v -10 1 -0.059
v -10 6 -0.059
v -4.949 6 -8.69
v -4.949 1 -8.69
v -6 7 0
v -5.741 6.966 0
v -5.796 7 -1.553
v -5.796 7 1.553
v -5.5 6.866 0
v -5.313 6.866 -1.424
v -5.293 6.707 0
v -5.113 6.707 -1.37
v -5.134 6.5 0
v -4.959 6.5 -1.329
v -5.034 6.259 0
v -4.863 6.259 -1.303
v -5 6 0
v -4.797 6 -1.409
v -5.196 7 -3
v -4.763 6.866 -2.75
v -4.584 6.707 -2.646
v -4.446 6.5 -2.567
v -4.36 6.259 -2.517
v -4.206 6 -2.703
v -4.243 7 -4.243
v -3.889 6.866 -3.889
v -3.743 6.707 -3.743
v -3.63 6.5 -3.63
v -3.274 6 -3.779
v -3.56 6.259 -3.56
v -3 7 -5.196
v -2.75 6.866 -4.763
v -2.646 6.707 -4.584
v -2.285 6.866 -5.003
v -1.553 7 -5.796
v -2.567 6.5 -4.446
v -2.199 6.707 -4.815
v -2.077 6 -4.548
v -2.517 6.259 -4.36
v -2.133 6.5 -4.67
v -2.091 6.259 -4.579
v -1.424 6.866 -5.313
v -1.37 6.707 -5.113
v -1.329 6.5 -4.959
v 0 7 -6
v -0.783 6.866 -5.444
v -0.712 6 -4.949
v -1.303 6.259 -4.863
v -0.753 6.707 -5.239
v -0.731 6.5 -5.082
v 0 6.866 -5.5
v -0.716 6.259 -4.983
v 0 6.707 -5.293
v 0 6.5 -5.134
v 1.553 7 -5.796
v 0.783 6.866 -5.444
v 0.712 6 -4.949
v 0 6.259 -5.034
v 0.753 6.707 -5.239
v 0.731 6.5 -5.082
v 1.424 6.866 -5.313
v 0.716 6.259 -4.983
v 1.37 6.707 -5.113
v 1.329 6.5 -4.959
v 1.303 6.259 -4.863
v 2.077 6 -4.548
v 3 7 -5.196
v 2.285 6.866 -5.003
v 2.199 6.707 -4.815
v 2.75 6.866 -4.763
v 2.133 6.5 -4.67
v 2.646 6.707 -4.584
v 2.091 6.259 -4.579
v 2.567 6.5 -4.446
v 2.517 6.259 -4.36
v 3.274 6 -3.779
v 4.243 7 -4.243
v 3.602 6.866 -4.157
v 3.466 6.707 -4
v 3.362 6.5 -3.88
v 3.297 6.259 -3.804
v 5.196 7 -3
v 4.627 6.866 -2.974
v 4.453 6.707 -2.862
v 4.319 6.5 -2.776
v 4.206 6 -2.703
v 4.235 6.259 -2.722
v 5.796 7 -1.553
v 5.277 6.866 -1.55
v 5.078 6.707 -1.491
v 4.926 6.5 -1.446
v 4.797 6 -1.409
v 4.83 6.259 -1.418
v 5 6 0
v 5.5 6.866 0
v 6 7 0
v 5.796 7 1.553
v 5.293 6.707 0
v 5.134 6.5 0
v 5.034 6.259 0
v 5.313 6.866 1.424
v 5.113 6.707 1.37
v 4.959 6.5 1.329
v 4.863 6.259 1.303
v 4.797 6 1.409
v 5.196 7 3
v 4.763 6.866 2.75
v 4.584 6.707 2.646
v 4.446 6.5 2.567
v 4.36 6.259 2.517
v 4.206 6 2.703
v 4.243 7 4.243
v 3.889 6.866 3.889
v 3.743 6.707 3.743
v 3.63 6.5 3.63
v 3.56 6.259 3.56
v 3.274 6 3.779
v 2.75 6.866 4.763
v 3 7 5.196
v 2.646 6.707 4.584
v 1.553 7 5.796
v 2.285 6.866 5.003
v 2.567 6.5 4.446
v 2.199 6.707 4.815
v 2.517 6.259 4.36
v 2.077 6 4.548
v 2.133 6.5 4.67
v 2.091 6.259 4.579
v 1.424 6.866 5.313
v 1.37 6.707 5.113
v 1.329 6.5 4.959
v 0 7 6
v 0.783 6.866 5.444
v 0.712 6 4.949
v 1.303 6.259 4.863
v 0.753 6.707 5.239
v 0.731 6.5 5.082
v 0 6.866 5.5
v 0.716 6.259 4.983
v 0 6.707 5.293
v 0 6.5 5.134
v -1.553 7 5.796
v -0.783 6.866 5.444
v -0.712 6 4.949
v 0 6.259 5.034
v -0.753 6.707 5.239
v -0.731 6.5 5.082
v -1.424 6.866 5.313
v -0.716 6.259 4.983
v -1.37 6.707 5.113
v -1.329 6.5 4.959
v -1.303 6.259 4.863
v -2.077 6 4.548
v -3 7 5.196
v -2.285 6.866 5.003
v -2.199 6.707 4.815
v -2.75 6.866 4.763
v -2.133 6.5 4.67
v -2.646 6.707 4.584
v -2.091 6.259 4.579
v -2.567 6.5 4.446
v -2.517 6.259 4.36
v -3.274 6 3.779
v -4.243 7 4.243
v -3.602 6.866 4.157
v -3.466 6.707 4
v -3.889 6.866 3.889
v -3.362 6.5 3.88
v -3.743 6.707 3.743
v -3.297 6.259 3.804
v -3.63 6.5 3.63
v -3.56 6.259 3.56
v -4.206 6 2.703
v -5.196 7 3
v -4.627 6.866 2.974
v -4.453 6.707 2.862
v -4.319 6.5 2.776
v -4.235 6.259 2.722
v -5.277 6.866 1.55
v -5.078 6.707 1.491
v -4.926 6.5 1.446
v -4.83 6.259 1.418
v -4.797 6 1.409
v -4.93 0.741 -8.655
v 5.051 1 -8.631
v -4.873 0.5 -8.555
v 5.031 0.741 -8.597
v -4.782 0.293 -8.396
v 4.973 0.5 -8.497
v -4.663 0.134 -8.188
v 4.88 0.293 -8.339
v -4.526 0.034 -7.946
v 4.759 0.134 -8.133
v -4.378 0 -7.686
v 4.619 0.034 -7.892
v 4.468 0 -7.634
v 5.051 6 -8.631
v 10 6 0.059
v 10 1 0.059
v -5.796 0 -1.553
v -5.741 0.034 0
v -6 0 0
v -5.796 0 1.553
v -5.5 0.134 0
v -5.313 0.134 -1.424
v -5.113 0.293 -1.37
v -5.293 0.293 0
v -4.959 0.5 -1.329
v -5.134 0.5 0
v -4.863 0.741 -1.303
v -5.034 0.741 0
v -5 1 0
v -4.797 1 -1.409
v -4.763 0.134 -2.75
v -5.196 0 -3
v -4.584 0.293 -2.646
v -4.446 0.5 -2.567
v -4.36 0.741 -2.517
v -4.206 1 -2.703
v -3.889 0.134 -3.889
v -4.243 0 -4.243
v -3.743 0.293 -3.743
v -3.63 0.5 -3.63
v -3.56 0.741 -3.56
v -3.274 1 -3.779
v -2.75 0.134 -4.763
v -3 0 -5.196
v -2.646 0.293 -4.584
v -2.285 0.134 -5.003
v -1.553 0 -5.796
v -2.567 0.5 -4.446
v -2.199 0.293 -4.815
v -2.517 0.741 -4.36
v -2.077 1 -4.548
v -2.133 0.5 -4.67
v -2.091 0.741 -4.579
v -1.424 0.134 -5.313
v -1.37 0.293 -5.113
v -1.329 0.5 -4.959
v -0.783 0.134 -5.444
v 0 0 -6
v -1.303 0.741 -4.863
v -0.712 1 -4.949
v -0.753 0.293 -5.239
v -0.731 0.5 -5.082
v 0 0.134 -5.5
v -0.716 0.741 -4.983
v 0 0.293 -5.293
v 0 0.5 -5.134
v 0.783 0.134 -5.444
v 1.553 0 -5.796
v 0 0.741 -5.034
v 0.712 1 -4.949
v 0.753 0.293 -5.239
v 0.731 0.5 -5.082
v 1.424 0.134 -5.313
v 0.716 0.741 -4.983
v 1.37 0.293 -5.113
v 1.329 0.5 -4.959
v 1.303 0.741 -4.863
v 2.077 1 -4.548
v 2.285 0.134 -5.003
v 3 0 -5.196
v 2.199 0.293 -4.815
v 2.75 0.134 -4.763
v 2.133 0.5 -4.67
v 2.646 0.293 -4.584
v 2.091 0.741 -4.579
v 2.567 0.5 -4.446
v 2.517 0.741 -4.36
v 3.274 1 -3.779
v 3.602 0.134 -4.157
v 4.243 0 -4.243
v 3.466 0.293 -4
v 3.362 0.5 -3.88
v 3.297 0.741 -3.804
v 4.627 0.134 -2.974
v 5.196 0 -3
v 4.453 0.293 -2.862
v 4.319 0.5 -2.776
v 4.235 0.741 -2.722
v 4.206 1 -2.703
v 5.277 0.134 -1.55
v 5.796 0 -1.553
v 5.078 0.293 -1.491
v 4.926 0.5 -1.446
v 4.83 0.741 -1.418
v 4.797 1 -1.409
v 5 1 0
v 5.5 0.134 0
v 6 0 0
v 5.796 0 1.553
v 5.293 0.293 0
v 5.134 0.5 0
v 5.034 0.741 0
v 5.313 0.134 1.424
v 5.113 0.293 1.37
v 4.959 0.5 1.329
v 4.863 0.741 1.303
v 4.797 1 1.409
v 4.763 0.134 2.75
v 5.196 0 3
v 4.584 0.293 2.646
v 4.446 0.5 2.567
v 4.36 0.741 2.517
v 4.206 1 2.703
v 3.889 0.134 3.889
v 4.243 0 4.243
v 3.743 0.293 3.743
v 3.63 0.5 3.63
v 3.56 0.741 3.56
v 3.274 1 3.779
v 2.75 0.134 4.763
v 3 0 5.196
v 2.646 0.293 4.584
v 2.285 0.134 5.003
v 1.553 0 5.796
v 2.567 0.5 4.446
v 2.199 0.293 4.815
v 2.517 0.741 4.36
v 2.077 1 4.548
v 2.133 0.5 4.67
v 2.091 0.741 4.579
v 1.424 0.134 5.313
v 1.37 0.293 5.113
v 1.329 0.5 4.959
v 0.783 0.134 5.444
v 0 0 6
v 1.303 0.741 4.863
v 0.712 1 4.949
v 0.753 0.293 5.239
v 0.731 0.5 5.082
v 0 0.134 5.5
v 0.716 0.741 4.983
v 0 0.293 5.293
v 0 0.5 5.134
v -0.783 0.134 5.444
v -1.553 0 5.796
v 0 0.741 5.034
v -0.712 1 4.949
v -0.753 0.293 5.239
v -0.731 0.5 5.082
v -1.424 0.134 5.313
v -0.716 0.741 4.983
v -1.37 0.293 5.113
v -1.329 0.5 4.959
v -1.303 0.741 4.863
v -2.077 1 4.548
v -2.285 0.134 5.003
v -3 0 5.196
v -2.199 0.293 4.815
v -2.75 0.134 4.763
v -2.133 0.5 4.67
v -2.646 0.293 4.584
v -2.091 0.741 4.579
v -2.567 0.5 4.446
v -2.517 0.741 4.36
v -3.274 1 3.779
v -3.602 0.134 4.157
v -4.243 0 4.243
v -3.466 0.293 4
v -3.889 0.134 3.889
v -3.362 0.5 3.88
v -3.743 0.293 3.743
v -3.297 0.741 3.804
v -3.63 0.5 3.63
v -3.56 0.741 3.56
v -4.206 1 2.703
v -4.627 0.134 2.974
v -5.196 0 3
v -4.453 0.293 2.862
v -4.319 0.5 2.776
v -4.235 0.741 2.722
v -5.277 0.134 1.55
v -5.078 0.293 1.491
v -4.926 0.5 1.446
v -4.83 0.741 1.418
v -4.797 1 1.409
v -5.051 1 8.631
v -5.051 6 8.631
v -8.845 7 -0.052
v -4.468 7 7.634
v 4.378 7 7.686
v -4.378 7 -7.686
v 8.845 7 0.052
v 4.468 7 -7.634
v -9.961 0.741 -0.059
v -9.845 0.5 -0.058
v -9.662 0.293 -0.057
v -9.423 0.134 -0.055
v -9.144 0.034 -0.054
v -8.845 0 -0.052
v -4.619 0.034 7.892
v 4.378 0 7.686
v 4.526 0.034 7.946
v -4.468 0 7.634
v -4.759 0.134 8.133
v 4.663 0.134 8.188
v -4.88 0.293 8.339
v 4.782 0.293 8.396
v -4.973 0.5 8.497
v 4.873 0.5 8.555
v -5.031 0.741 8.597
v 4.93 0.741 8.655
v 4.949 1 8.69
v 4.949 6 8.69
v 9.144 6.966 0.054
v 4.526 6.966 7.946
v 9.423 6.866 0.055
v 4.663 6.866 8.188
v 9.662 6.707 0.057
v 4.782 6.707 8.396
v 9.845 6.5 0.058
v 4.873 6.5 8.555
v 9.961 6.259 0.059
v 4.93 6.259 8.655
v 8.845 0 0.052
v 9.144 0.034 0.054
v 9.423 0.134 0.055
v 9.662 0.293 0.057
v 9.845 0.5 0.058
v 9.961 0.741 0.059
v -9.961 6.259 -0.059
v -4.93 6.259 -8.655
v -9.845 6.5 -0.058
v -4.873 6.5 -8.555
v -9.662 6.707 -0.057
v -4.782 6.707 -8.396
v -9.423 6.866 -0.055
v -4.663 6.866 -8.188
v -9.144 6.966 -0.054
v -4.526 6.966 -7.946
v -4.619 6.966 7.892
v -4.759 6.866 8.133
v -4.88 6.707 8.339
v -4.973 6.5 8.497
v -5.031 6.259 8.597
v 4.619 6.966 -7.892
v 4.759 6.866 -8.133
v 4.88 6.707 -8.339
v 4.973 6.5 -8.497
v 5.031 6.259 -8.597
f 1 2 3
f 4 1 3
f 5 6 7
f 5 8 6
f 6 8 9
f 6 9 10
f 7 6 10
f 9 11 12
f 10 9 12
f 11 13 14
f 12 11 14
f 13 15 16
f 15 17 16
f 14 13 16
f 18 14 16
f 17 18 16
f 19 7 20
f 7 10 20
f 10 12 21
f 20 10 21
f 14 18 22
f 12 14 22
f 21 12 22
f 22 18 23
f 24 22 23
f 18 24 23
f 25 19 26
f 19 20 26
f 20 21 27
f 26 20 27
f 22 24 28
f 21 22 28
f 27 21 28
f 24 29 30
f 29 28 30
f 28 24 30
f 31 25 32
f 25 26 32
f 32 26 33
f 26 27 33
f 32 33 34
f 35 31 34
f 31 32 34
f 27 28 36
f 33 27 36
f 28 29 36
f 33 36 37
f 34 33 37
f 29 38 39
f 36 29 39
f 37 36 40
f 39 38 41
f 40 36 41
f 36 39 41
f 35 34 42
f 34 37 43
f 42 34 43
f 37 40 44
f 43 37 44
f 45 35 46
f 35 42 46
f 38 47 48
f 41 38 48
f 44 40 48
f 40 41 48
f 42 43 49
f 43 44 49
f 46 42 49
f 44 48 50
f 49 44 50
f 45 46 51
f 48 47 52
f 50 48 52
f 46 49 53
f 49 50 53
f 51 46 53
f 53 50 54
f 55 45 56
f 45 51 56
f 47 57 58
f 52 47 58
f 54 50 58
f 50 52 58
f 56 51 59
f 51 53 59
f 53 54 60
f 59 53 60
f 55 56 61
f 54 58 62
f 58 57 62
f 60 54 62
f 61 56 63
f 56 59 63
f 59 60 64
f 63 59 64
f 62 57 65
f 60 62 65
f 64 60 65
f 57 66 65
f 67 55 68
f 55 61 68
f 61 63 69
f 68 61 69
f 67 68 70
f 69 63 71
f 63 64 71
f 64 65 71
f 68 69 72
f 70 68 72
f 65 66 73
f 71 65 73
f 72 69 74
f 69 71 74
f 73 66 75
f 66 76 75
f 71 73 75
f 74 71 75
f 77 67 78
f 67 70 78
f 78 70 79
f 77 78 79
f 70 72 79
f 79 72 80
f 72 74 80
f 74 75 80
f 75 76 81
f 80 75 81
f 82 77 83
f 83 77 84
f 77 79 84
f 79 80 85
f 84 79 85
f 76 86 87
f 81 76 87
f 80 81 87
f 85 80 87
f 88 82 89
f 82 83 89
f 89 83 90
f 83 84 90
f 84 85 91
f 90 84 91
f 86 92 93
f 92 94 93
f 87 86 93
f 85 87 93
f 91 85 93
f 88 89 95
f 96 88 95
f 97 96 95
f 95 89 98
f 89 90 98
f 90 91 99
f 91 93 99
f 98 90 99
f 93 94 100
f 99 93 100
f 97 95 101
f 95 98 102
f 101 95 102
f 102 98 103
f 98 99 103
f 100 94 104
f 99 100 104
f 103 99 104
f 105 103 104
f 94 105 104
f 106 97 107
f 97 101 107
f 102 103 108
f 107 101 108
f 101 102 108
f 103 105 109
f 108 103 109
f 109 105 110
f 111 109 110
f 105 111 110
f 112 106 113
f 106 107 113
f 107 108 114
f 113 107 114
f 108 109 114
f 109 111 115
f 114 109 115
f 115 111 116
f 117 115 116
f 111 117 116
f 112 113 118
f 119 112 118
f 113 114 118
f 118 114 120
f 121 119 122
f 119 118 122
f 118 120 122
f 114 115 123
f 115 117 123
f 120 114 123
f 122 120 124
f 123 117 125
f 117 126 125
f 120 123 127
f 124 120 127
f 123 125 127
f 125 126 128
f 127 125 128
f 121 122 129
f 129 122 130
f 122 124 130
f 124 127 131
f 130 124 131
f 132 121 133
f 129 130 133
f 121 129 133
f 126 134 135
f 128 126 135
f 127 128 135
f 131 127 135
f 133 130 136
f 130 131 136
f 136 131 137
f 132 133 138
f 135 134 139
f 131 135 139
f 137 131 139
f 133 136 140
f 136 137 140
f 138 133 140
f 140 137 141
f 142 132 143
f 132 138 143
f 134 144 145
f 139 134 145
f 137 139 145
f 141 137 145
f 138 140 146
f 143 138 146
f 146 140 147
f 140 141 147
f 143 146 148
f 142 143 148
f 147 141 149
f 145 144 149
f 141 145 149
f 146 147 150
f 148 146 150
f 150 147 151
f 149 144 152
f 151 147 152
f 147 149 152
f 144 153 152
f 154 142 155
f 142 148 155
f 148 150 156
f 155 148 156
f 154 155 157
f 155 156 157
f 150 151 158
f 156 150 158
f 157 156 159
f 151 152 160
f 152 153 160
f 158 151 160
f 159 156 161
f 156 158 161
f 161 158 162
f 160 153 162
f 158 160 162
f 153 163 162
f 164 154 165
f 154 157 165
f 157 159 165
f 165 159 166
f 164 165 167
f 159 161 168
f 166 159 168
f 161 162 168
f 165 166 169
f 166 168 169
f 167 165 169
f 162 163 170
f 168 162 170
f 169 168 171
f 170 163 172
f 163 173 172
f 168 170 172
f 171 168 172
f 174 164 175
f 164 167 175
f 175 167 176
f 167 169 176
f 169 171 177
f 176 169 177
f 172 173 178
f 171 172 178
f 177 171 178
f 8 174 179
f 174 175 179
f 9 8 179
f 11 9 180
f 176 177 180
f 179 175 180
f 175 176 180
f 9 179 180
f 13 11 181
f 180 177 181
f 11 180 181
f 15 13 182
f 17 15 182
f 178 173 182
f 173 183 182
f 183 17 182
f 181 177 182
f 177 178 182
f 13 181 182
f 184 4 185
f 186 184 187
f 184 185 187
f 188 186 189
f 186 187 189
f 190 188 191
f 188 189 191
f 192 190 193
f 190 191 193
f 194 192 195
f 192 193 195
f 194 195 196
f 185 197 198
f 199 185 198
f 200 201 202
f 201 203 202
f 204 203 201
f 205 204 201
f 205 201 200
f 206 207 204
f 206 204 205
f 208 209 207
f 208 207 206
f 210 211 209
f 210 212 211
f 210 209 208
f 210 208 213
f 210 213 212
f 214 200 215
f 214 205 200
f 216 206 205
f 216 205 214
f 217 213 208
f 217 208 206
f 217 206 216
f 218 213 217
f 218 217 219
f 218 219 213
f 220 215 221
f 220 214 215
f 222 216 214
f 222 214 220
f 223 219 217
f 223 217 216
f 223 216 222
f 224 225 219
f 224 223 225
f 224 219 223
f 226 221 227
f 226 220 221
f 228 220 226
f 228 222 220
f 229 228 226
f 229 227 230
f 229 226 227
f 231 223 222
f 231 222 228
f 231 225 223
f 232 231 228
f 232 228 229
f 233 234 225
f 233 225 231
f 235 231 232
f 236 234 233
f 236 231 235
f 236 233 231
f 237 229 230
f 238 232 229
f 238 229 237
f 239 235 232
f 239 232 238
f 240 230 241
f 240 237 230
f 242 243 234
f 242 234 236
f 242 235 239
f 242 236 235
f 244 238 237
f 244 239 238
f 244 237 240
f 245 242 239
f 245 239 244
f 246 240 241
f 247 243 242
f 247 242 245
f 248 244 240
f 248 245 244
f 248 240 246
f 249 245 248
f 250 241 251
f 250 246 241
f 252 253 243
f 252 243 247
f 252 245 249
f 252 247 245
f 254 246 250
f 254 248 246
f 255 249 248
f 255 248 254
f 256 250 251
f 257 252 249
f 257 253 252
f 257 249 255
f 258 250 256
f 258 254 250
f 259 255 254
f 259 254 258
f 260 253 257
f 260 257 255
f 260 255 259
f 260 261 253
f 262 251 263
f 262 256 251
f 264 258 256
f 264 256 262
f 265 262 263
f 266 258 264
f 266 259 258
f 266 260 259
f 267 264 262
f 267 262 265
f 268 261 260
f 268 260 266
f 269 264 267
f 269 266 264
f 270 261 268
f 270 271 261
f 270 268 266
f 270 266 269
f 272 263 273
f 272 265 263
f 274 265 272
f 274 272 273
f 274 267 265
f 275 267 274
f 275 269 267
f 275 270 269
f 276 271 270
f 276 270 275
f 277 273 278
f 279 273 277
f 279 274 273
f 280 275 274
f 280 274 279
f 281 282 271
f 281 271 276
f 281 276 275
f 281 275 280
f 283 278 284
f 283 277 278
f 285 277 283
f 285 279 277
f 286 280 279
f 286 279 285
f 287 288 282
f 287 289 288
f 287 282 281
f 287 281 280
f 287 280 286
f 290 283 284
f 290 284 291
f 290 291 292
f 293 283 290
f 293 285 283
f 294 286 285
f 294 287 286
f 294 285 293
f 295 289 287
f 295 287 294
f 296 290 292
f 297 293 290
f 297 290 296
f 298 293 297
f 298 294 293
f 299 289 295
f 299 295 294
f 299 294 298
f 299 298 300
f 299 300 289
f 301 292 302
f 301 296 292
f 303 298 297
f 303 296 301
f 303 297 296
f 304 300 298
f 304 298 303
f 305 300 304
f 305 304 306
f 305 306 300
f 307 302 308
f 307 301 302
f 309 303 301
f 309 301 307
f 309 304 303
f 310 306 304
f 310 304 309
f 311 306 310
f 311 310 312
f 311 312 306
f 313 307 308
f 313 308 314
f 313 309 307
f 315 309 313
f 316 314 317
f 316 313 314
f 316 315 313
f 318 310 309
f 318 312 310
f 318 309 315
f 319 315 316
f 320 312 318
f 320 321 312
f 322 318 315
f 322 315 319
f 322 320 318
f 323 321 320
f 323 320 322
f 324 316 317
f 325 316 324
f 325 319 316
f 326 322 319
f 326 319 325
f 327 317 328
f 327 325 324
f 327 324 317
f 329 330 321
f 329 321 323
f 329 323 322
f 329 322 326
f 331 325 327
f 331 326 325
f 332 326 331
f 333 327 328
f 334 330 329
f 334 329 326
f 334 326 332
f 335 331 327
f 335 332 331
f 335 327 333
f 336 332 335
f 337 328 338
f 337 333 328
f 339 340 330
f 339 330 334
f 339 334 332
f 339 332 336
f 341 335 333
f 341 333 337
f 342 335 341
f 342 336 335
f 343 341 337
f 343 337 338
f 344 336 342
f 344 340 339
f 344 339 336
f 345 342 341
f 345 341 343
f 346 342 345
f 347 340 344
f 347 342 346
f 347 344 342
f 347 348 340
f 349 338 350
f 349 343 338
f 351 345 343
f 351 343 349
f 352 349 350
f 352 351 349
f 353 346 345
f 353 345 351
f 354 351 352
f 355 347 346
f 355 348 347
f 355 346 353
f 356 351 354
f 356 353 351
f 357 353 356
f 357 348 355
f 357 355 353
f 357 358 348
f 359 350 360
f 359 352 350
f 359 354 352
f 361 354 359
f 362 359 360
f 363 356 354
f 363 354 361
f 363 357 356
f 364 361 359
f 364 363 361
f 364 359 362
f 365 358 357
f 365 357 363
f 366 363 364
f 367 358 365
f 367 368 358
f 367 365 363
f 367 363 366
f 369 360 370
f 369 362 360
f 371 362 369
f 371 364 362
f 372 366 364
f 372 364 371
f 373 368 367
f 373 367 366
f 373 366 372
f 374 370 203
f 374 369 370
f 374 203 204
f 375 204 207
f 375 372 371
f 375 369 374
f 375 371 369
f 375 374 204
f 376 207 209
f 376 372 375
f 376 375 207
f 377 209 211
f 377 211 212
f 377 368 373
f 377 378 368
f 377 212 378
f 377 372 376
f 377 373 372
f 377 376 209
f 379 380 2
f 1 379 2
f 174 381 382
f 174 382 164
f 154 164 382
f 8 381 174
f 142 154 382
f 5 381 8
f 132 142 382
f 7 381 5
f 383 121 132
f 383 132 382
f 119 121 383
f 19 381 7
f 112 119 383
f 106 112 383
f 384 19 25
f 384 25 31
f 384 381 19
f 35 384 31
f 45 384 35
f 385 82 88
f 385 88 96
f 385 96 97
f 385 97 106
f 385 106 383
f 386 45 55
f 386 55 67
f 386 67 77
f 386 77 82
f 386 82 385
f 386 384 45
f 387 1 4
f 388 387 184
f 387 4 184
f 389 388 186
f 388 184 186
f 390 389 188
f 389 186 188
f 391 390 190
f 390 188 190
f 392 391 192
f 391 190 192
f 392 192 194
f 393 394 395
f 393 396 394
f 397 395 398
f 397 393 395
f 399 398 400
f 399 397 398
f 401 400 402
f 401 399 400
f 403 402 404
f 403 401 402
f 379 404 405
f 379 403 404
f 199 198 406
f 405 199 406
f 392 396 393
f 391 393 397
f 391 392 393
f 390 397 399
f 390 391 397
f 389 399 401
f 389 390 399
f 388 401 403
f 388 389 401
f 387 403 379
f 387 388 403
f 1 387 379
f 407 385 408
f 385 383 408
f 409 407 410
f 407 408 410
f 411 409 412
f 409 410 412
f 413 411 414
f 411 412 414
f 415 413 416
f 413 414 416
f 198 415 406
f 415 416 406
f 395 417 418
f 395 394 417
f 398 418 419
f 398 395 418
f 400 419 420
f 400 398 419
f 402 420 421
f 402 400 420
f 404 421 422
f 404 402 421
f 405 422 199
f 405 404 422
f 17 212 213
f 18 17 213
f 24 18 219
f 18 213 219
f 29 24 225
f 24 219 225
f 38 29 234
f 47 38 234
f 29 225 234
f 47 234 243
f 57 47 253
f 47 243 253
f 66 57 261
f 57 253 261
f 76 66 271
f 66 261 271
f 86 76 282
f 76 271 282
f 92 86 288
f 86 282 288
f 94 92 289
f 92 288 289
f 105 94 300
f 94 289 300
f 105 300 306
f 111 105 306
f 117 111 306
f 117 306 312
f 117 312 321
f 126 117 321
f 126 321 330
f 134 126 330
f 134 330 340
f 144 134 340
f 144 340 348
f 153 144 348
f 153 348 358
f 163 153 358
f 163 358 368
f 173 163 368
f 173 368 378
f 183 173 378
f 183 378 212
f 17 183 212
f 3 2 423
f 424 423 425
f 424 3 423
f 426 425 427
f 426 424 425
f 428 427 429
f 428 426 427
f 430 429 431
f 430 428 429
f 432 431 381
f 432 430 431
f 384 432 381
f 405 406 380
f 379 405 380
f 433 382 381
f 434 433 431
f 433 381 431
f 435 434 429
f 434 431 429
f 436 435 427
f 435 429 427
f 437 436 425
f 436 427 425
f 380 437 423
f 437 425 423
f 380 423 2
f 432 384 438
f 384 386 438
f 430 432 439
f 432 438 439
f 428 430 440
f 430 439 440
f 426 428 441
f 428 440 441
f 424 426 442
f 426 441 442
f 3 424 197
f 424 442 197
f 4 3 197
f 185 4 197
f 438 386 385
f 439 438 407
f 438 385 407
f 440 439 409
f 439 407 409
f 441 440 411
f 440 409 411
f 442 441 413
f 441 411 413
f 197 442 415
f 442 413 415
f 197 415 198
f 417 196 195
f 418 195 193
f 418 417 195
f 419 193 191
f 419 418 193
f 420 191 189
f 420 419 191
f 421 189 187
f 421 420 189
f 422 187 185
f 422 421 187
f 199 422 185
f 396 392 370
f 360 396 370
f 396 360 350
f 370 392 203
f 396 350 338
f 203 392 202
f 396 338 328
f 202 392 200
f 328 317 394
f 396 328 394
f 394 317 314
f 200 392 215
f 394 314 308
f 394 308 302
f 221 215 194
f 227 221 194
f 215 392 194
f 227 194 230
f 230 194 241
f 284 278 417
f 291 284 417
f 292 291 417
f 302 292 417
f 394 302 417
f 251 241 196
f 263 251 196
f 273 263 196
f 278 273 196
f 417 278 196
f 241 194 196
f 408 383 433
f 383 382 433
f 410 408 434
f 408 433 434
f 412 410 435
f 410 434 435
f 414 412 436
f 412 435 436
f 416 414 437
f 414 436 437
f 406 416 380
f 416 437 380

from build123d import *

# Parameters (mm, degrees)
SKETCH1_W                        = 20
SKETCH1_H                        = 20
BOSS_EXTRUDE1_DEPTH              = 7
F_10_0MM_CLEARANCE_DOWEL_HOLE1_D = 10
CUT_EXTRUDE1_DEPTH               = 16.779733838
FILLET1_R                        = 1


with BuildPart() as part:
    # Sketch1 → Boss-Extrude1 (new body)
    with BuildSketch(Plane(origin=(0, 0, 0), x_dir=(1, 0, 0), z_dir=(0, 1, 0))):
        Rectangle(SKETCH1_W, SKETCH1_H)
    extrude(amount=BOSS_EXTRUDE1_DEPTH)

    # Ø10.0mm Clearance Dowel Hole1 (through all)
    with Locations(Plane(origin=(0, 7, 0), x_dir=(1, 0, 0), z_dir=(0, 1, 0))):
        with Locations((0, 0)):
            Hole(F_10_0MM_CLEARANCE_DOWEL_HOLE1_D / 2)

    # Sketch6 → Cut-Extrude1 (cut, through all)
    with BuildSketch(Plane(origin=(0, 7, 0), x_dir=(1, 0, 0), z_dir=(0, 1, 0))):
        Polygon((-10, 10), (-10, 0.058741053), (-4.949128756, 8.689624564), (5.050871244, 8.630883511), (10, -0.058741053), (10, 10), align=None)
        Polygon((4.949128756, -8.689624564), (-5.050871244, -8.630883511), (-10, 0.058741053), (-10, -10), (10, -10), (10, -0.058741053), align=None)
    extrude(amount=-CUT_EXTRUDE1_DEPTH, mode=Mode.SUBTRACT)

    # Fillet1
    fillet1_edges = [part.edges().sort_by_distance(p)[0] for p in [
        (5, 7, 0),
        (5, 0, 0),
        (-7.474564378, 7, -4.374182809),
        (7.525435622, 7, -4.286071229),
        (0.050871244, 7, -8.660254038),
        (-7.474564378, 0, -4.374182809),
        (7.525435622, 0, -4.286071229),
        (0.050871244, 0, -8.660254038),
        (-7.525435622, 7, 4.286071229),
        (-0.050871244, 7, 8.660254038),
        (7.474564378, 7, 4.374182809),
        (-7.525435622, 0, 4.286071229),
        (-0.050871244, 0, 8.660254038),
        (7.474564378, 0, 4.374182809),
    ]]
    fillet(fillet1_edges, radius=FILLET1_R)


solid = part.part
